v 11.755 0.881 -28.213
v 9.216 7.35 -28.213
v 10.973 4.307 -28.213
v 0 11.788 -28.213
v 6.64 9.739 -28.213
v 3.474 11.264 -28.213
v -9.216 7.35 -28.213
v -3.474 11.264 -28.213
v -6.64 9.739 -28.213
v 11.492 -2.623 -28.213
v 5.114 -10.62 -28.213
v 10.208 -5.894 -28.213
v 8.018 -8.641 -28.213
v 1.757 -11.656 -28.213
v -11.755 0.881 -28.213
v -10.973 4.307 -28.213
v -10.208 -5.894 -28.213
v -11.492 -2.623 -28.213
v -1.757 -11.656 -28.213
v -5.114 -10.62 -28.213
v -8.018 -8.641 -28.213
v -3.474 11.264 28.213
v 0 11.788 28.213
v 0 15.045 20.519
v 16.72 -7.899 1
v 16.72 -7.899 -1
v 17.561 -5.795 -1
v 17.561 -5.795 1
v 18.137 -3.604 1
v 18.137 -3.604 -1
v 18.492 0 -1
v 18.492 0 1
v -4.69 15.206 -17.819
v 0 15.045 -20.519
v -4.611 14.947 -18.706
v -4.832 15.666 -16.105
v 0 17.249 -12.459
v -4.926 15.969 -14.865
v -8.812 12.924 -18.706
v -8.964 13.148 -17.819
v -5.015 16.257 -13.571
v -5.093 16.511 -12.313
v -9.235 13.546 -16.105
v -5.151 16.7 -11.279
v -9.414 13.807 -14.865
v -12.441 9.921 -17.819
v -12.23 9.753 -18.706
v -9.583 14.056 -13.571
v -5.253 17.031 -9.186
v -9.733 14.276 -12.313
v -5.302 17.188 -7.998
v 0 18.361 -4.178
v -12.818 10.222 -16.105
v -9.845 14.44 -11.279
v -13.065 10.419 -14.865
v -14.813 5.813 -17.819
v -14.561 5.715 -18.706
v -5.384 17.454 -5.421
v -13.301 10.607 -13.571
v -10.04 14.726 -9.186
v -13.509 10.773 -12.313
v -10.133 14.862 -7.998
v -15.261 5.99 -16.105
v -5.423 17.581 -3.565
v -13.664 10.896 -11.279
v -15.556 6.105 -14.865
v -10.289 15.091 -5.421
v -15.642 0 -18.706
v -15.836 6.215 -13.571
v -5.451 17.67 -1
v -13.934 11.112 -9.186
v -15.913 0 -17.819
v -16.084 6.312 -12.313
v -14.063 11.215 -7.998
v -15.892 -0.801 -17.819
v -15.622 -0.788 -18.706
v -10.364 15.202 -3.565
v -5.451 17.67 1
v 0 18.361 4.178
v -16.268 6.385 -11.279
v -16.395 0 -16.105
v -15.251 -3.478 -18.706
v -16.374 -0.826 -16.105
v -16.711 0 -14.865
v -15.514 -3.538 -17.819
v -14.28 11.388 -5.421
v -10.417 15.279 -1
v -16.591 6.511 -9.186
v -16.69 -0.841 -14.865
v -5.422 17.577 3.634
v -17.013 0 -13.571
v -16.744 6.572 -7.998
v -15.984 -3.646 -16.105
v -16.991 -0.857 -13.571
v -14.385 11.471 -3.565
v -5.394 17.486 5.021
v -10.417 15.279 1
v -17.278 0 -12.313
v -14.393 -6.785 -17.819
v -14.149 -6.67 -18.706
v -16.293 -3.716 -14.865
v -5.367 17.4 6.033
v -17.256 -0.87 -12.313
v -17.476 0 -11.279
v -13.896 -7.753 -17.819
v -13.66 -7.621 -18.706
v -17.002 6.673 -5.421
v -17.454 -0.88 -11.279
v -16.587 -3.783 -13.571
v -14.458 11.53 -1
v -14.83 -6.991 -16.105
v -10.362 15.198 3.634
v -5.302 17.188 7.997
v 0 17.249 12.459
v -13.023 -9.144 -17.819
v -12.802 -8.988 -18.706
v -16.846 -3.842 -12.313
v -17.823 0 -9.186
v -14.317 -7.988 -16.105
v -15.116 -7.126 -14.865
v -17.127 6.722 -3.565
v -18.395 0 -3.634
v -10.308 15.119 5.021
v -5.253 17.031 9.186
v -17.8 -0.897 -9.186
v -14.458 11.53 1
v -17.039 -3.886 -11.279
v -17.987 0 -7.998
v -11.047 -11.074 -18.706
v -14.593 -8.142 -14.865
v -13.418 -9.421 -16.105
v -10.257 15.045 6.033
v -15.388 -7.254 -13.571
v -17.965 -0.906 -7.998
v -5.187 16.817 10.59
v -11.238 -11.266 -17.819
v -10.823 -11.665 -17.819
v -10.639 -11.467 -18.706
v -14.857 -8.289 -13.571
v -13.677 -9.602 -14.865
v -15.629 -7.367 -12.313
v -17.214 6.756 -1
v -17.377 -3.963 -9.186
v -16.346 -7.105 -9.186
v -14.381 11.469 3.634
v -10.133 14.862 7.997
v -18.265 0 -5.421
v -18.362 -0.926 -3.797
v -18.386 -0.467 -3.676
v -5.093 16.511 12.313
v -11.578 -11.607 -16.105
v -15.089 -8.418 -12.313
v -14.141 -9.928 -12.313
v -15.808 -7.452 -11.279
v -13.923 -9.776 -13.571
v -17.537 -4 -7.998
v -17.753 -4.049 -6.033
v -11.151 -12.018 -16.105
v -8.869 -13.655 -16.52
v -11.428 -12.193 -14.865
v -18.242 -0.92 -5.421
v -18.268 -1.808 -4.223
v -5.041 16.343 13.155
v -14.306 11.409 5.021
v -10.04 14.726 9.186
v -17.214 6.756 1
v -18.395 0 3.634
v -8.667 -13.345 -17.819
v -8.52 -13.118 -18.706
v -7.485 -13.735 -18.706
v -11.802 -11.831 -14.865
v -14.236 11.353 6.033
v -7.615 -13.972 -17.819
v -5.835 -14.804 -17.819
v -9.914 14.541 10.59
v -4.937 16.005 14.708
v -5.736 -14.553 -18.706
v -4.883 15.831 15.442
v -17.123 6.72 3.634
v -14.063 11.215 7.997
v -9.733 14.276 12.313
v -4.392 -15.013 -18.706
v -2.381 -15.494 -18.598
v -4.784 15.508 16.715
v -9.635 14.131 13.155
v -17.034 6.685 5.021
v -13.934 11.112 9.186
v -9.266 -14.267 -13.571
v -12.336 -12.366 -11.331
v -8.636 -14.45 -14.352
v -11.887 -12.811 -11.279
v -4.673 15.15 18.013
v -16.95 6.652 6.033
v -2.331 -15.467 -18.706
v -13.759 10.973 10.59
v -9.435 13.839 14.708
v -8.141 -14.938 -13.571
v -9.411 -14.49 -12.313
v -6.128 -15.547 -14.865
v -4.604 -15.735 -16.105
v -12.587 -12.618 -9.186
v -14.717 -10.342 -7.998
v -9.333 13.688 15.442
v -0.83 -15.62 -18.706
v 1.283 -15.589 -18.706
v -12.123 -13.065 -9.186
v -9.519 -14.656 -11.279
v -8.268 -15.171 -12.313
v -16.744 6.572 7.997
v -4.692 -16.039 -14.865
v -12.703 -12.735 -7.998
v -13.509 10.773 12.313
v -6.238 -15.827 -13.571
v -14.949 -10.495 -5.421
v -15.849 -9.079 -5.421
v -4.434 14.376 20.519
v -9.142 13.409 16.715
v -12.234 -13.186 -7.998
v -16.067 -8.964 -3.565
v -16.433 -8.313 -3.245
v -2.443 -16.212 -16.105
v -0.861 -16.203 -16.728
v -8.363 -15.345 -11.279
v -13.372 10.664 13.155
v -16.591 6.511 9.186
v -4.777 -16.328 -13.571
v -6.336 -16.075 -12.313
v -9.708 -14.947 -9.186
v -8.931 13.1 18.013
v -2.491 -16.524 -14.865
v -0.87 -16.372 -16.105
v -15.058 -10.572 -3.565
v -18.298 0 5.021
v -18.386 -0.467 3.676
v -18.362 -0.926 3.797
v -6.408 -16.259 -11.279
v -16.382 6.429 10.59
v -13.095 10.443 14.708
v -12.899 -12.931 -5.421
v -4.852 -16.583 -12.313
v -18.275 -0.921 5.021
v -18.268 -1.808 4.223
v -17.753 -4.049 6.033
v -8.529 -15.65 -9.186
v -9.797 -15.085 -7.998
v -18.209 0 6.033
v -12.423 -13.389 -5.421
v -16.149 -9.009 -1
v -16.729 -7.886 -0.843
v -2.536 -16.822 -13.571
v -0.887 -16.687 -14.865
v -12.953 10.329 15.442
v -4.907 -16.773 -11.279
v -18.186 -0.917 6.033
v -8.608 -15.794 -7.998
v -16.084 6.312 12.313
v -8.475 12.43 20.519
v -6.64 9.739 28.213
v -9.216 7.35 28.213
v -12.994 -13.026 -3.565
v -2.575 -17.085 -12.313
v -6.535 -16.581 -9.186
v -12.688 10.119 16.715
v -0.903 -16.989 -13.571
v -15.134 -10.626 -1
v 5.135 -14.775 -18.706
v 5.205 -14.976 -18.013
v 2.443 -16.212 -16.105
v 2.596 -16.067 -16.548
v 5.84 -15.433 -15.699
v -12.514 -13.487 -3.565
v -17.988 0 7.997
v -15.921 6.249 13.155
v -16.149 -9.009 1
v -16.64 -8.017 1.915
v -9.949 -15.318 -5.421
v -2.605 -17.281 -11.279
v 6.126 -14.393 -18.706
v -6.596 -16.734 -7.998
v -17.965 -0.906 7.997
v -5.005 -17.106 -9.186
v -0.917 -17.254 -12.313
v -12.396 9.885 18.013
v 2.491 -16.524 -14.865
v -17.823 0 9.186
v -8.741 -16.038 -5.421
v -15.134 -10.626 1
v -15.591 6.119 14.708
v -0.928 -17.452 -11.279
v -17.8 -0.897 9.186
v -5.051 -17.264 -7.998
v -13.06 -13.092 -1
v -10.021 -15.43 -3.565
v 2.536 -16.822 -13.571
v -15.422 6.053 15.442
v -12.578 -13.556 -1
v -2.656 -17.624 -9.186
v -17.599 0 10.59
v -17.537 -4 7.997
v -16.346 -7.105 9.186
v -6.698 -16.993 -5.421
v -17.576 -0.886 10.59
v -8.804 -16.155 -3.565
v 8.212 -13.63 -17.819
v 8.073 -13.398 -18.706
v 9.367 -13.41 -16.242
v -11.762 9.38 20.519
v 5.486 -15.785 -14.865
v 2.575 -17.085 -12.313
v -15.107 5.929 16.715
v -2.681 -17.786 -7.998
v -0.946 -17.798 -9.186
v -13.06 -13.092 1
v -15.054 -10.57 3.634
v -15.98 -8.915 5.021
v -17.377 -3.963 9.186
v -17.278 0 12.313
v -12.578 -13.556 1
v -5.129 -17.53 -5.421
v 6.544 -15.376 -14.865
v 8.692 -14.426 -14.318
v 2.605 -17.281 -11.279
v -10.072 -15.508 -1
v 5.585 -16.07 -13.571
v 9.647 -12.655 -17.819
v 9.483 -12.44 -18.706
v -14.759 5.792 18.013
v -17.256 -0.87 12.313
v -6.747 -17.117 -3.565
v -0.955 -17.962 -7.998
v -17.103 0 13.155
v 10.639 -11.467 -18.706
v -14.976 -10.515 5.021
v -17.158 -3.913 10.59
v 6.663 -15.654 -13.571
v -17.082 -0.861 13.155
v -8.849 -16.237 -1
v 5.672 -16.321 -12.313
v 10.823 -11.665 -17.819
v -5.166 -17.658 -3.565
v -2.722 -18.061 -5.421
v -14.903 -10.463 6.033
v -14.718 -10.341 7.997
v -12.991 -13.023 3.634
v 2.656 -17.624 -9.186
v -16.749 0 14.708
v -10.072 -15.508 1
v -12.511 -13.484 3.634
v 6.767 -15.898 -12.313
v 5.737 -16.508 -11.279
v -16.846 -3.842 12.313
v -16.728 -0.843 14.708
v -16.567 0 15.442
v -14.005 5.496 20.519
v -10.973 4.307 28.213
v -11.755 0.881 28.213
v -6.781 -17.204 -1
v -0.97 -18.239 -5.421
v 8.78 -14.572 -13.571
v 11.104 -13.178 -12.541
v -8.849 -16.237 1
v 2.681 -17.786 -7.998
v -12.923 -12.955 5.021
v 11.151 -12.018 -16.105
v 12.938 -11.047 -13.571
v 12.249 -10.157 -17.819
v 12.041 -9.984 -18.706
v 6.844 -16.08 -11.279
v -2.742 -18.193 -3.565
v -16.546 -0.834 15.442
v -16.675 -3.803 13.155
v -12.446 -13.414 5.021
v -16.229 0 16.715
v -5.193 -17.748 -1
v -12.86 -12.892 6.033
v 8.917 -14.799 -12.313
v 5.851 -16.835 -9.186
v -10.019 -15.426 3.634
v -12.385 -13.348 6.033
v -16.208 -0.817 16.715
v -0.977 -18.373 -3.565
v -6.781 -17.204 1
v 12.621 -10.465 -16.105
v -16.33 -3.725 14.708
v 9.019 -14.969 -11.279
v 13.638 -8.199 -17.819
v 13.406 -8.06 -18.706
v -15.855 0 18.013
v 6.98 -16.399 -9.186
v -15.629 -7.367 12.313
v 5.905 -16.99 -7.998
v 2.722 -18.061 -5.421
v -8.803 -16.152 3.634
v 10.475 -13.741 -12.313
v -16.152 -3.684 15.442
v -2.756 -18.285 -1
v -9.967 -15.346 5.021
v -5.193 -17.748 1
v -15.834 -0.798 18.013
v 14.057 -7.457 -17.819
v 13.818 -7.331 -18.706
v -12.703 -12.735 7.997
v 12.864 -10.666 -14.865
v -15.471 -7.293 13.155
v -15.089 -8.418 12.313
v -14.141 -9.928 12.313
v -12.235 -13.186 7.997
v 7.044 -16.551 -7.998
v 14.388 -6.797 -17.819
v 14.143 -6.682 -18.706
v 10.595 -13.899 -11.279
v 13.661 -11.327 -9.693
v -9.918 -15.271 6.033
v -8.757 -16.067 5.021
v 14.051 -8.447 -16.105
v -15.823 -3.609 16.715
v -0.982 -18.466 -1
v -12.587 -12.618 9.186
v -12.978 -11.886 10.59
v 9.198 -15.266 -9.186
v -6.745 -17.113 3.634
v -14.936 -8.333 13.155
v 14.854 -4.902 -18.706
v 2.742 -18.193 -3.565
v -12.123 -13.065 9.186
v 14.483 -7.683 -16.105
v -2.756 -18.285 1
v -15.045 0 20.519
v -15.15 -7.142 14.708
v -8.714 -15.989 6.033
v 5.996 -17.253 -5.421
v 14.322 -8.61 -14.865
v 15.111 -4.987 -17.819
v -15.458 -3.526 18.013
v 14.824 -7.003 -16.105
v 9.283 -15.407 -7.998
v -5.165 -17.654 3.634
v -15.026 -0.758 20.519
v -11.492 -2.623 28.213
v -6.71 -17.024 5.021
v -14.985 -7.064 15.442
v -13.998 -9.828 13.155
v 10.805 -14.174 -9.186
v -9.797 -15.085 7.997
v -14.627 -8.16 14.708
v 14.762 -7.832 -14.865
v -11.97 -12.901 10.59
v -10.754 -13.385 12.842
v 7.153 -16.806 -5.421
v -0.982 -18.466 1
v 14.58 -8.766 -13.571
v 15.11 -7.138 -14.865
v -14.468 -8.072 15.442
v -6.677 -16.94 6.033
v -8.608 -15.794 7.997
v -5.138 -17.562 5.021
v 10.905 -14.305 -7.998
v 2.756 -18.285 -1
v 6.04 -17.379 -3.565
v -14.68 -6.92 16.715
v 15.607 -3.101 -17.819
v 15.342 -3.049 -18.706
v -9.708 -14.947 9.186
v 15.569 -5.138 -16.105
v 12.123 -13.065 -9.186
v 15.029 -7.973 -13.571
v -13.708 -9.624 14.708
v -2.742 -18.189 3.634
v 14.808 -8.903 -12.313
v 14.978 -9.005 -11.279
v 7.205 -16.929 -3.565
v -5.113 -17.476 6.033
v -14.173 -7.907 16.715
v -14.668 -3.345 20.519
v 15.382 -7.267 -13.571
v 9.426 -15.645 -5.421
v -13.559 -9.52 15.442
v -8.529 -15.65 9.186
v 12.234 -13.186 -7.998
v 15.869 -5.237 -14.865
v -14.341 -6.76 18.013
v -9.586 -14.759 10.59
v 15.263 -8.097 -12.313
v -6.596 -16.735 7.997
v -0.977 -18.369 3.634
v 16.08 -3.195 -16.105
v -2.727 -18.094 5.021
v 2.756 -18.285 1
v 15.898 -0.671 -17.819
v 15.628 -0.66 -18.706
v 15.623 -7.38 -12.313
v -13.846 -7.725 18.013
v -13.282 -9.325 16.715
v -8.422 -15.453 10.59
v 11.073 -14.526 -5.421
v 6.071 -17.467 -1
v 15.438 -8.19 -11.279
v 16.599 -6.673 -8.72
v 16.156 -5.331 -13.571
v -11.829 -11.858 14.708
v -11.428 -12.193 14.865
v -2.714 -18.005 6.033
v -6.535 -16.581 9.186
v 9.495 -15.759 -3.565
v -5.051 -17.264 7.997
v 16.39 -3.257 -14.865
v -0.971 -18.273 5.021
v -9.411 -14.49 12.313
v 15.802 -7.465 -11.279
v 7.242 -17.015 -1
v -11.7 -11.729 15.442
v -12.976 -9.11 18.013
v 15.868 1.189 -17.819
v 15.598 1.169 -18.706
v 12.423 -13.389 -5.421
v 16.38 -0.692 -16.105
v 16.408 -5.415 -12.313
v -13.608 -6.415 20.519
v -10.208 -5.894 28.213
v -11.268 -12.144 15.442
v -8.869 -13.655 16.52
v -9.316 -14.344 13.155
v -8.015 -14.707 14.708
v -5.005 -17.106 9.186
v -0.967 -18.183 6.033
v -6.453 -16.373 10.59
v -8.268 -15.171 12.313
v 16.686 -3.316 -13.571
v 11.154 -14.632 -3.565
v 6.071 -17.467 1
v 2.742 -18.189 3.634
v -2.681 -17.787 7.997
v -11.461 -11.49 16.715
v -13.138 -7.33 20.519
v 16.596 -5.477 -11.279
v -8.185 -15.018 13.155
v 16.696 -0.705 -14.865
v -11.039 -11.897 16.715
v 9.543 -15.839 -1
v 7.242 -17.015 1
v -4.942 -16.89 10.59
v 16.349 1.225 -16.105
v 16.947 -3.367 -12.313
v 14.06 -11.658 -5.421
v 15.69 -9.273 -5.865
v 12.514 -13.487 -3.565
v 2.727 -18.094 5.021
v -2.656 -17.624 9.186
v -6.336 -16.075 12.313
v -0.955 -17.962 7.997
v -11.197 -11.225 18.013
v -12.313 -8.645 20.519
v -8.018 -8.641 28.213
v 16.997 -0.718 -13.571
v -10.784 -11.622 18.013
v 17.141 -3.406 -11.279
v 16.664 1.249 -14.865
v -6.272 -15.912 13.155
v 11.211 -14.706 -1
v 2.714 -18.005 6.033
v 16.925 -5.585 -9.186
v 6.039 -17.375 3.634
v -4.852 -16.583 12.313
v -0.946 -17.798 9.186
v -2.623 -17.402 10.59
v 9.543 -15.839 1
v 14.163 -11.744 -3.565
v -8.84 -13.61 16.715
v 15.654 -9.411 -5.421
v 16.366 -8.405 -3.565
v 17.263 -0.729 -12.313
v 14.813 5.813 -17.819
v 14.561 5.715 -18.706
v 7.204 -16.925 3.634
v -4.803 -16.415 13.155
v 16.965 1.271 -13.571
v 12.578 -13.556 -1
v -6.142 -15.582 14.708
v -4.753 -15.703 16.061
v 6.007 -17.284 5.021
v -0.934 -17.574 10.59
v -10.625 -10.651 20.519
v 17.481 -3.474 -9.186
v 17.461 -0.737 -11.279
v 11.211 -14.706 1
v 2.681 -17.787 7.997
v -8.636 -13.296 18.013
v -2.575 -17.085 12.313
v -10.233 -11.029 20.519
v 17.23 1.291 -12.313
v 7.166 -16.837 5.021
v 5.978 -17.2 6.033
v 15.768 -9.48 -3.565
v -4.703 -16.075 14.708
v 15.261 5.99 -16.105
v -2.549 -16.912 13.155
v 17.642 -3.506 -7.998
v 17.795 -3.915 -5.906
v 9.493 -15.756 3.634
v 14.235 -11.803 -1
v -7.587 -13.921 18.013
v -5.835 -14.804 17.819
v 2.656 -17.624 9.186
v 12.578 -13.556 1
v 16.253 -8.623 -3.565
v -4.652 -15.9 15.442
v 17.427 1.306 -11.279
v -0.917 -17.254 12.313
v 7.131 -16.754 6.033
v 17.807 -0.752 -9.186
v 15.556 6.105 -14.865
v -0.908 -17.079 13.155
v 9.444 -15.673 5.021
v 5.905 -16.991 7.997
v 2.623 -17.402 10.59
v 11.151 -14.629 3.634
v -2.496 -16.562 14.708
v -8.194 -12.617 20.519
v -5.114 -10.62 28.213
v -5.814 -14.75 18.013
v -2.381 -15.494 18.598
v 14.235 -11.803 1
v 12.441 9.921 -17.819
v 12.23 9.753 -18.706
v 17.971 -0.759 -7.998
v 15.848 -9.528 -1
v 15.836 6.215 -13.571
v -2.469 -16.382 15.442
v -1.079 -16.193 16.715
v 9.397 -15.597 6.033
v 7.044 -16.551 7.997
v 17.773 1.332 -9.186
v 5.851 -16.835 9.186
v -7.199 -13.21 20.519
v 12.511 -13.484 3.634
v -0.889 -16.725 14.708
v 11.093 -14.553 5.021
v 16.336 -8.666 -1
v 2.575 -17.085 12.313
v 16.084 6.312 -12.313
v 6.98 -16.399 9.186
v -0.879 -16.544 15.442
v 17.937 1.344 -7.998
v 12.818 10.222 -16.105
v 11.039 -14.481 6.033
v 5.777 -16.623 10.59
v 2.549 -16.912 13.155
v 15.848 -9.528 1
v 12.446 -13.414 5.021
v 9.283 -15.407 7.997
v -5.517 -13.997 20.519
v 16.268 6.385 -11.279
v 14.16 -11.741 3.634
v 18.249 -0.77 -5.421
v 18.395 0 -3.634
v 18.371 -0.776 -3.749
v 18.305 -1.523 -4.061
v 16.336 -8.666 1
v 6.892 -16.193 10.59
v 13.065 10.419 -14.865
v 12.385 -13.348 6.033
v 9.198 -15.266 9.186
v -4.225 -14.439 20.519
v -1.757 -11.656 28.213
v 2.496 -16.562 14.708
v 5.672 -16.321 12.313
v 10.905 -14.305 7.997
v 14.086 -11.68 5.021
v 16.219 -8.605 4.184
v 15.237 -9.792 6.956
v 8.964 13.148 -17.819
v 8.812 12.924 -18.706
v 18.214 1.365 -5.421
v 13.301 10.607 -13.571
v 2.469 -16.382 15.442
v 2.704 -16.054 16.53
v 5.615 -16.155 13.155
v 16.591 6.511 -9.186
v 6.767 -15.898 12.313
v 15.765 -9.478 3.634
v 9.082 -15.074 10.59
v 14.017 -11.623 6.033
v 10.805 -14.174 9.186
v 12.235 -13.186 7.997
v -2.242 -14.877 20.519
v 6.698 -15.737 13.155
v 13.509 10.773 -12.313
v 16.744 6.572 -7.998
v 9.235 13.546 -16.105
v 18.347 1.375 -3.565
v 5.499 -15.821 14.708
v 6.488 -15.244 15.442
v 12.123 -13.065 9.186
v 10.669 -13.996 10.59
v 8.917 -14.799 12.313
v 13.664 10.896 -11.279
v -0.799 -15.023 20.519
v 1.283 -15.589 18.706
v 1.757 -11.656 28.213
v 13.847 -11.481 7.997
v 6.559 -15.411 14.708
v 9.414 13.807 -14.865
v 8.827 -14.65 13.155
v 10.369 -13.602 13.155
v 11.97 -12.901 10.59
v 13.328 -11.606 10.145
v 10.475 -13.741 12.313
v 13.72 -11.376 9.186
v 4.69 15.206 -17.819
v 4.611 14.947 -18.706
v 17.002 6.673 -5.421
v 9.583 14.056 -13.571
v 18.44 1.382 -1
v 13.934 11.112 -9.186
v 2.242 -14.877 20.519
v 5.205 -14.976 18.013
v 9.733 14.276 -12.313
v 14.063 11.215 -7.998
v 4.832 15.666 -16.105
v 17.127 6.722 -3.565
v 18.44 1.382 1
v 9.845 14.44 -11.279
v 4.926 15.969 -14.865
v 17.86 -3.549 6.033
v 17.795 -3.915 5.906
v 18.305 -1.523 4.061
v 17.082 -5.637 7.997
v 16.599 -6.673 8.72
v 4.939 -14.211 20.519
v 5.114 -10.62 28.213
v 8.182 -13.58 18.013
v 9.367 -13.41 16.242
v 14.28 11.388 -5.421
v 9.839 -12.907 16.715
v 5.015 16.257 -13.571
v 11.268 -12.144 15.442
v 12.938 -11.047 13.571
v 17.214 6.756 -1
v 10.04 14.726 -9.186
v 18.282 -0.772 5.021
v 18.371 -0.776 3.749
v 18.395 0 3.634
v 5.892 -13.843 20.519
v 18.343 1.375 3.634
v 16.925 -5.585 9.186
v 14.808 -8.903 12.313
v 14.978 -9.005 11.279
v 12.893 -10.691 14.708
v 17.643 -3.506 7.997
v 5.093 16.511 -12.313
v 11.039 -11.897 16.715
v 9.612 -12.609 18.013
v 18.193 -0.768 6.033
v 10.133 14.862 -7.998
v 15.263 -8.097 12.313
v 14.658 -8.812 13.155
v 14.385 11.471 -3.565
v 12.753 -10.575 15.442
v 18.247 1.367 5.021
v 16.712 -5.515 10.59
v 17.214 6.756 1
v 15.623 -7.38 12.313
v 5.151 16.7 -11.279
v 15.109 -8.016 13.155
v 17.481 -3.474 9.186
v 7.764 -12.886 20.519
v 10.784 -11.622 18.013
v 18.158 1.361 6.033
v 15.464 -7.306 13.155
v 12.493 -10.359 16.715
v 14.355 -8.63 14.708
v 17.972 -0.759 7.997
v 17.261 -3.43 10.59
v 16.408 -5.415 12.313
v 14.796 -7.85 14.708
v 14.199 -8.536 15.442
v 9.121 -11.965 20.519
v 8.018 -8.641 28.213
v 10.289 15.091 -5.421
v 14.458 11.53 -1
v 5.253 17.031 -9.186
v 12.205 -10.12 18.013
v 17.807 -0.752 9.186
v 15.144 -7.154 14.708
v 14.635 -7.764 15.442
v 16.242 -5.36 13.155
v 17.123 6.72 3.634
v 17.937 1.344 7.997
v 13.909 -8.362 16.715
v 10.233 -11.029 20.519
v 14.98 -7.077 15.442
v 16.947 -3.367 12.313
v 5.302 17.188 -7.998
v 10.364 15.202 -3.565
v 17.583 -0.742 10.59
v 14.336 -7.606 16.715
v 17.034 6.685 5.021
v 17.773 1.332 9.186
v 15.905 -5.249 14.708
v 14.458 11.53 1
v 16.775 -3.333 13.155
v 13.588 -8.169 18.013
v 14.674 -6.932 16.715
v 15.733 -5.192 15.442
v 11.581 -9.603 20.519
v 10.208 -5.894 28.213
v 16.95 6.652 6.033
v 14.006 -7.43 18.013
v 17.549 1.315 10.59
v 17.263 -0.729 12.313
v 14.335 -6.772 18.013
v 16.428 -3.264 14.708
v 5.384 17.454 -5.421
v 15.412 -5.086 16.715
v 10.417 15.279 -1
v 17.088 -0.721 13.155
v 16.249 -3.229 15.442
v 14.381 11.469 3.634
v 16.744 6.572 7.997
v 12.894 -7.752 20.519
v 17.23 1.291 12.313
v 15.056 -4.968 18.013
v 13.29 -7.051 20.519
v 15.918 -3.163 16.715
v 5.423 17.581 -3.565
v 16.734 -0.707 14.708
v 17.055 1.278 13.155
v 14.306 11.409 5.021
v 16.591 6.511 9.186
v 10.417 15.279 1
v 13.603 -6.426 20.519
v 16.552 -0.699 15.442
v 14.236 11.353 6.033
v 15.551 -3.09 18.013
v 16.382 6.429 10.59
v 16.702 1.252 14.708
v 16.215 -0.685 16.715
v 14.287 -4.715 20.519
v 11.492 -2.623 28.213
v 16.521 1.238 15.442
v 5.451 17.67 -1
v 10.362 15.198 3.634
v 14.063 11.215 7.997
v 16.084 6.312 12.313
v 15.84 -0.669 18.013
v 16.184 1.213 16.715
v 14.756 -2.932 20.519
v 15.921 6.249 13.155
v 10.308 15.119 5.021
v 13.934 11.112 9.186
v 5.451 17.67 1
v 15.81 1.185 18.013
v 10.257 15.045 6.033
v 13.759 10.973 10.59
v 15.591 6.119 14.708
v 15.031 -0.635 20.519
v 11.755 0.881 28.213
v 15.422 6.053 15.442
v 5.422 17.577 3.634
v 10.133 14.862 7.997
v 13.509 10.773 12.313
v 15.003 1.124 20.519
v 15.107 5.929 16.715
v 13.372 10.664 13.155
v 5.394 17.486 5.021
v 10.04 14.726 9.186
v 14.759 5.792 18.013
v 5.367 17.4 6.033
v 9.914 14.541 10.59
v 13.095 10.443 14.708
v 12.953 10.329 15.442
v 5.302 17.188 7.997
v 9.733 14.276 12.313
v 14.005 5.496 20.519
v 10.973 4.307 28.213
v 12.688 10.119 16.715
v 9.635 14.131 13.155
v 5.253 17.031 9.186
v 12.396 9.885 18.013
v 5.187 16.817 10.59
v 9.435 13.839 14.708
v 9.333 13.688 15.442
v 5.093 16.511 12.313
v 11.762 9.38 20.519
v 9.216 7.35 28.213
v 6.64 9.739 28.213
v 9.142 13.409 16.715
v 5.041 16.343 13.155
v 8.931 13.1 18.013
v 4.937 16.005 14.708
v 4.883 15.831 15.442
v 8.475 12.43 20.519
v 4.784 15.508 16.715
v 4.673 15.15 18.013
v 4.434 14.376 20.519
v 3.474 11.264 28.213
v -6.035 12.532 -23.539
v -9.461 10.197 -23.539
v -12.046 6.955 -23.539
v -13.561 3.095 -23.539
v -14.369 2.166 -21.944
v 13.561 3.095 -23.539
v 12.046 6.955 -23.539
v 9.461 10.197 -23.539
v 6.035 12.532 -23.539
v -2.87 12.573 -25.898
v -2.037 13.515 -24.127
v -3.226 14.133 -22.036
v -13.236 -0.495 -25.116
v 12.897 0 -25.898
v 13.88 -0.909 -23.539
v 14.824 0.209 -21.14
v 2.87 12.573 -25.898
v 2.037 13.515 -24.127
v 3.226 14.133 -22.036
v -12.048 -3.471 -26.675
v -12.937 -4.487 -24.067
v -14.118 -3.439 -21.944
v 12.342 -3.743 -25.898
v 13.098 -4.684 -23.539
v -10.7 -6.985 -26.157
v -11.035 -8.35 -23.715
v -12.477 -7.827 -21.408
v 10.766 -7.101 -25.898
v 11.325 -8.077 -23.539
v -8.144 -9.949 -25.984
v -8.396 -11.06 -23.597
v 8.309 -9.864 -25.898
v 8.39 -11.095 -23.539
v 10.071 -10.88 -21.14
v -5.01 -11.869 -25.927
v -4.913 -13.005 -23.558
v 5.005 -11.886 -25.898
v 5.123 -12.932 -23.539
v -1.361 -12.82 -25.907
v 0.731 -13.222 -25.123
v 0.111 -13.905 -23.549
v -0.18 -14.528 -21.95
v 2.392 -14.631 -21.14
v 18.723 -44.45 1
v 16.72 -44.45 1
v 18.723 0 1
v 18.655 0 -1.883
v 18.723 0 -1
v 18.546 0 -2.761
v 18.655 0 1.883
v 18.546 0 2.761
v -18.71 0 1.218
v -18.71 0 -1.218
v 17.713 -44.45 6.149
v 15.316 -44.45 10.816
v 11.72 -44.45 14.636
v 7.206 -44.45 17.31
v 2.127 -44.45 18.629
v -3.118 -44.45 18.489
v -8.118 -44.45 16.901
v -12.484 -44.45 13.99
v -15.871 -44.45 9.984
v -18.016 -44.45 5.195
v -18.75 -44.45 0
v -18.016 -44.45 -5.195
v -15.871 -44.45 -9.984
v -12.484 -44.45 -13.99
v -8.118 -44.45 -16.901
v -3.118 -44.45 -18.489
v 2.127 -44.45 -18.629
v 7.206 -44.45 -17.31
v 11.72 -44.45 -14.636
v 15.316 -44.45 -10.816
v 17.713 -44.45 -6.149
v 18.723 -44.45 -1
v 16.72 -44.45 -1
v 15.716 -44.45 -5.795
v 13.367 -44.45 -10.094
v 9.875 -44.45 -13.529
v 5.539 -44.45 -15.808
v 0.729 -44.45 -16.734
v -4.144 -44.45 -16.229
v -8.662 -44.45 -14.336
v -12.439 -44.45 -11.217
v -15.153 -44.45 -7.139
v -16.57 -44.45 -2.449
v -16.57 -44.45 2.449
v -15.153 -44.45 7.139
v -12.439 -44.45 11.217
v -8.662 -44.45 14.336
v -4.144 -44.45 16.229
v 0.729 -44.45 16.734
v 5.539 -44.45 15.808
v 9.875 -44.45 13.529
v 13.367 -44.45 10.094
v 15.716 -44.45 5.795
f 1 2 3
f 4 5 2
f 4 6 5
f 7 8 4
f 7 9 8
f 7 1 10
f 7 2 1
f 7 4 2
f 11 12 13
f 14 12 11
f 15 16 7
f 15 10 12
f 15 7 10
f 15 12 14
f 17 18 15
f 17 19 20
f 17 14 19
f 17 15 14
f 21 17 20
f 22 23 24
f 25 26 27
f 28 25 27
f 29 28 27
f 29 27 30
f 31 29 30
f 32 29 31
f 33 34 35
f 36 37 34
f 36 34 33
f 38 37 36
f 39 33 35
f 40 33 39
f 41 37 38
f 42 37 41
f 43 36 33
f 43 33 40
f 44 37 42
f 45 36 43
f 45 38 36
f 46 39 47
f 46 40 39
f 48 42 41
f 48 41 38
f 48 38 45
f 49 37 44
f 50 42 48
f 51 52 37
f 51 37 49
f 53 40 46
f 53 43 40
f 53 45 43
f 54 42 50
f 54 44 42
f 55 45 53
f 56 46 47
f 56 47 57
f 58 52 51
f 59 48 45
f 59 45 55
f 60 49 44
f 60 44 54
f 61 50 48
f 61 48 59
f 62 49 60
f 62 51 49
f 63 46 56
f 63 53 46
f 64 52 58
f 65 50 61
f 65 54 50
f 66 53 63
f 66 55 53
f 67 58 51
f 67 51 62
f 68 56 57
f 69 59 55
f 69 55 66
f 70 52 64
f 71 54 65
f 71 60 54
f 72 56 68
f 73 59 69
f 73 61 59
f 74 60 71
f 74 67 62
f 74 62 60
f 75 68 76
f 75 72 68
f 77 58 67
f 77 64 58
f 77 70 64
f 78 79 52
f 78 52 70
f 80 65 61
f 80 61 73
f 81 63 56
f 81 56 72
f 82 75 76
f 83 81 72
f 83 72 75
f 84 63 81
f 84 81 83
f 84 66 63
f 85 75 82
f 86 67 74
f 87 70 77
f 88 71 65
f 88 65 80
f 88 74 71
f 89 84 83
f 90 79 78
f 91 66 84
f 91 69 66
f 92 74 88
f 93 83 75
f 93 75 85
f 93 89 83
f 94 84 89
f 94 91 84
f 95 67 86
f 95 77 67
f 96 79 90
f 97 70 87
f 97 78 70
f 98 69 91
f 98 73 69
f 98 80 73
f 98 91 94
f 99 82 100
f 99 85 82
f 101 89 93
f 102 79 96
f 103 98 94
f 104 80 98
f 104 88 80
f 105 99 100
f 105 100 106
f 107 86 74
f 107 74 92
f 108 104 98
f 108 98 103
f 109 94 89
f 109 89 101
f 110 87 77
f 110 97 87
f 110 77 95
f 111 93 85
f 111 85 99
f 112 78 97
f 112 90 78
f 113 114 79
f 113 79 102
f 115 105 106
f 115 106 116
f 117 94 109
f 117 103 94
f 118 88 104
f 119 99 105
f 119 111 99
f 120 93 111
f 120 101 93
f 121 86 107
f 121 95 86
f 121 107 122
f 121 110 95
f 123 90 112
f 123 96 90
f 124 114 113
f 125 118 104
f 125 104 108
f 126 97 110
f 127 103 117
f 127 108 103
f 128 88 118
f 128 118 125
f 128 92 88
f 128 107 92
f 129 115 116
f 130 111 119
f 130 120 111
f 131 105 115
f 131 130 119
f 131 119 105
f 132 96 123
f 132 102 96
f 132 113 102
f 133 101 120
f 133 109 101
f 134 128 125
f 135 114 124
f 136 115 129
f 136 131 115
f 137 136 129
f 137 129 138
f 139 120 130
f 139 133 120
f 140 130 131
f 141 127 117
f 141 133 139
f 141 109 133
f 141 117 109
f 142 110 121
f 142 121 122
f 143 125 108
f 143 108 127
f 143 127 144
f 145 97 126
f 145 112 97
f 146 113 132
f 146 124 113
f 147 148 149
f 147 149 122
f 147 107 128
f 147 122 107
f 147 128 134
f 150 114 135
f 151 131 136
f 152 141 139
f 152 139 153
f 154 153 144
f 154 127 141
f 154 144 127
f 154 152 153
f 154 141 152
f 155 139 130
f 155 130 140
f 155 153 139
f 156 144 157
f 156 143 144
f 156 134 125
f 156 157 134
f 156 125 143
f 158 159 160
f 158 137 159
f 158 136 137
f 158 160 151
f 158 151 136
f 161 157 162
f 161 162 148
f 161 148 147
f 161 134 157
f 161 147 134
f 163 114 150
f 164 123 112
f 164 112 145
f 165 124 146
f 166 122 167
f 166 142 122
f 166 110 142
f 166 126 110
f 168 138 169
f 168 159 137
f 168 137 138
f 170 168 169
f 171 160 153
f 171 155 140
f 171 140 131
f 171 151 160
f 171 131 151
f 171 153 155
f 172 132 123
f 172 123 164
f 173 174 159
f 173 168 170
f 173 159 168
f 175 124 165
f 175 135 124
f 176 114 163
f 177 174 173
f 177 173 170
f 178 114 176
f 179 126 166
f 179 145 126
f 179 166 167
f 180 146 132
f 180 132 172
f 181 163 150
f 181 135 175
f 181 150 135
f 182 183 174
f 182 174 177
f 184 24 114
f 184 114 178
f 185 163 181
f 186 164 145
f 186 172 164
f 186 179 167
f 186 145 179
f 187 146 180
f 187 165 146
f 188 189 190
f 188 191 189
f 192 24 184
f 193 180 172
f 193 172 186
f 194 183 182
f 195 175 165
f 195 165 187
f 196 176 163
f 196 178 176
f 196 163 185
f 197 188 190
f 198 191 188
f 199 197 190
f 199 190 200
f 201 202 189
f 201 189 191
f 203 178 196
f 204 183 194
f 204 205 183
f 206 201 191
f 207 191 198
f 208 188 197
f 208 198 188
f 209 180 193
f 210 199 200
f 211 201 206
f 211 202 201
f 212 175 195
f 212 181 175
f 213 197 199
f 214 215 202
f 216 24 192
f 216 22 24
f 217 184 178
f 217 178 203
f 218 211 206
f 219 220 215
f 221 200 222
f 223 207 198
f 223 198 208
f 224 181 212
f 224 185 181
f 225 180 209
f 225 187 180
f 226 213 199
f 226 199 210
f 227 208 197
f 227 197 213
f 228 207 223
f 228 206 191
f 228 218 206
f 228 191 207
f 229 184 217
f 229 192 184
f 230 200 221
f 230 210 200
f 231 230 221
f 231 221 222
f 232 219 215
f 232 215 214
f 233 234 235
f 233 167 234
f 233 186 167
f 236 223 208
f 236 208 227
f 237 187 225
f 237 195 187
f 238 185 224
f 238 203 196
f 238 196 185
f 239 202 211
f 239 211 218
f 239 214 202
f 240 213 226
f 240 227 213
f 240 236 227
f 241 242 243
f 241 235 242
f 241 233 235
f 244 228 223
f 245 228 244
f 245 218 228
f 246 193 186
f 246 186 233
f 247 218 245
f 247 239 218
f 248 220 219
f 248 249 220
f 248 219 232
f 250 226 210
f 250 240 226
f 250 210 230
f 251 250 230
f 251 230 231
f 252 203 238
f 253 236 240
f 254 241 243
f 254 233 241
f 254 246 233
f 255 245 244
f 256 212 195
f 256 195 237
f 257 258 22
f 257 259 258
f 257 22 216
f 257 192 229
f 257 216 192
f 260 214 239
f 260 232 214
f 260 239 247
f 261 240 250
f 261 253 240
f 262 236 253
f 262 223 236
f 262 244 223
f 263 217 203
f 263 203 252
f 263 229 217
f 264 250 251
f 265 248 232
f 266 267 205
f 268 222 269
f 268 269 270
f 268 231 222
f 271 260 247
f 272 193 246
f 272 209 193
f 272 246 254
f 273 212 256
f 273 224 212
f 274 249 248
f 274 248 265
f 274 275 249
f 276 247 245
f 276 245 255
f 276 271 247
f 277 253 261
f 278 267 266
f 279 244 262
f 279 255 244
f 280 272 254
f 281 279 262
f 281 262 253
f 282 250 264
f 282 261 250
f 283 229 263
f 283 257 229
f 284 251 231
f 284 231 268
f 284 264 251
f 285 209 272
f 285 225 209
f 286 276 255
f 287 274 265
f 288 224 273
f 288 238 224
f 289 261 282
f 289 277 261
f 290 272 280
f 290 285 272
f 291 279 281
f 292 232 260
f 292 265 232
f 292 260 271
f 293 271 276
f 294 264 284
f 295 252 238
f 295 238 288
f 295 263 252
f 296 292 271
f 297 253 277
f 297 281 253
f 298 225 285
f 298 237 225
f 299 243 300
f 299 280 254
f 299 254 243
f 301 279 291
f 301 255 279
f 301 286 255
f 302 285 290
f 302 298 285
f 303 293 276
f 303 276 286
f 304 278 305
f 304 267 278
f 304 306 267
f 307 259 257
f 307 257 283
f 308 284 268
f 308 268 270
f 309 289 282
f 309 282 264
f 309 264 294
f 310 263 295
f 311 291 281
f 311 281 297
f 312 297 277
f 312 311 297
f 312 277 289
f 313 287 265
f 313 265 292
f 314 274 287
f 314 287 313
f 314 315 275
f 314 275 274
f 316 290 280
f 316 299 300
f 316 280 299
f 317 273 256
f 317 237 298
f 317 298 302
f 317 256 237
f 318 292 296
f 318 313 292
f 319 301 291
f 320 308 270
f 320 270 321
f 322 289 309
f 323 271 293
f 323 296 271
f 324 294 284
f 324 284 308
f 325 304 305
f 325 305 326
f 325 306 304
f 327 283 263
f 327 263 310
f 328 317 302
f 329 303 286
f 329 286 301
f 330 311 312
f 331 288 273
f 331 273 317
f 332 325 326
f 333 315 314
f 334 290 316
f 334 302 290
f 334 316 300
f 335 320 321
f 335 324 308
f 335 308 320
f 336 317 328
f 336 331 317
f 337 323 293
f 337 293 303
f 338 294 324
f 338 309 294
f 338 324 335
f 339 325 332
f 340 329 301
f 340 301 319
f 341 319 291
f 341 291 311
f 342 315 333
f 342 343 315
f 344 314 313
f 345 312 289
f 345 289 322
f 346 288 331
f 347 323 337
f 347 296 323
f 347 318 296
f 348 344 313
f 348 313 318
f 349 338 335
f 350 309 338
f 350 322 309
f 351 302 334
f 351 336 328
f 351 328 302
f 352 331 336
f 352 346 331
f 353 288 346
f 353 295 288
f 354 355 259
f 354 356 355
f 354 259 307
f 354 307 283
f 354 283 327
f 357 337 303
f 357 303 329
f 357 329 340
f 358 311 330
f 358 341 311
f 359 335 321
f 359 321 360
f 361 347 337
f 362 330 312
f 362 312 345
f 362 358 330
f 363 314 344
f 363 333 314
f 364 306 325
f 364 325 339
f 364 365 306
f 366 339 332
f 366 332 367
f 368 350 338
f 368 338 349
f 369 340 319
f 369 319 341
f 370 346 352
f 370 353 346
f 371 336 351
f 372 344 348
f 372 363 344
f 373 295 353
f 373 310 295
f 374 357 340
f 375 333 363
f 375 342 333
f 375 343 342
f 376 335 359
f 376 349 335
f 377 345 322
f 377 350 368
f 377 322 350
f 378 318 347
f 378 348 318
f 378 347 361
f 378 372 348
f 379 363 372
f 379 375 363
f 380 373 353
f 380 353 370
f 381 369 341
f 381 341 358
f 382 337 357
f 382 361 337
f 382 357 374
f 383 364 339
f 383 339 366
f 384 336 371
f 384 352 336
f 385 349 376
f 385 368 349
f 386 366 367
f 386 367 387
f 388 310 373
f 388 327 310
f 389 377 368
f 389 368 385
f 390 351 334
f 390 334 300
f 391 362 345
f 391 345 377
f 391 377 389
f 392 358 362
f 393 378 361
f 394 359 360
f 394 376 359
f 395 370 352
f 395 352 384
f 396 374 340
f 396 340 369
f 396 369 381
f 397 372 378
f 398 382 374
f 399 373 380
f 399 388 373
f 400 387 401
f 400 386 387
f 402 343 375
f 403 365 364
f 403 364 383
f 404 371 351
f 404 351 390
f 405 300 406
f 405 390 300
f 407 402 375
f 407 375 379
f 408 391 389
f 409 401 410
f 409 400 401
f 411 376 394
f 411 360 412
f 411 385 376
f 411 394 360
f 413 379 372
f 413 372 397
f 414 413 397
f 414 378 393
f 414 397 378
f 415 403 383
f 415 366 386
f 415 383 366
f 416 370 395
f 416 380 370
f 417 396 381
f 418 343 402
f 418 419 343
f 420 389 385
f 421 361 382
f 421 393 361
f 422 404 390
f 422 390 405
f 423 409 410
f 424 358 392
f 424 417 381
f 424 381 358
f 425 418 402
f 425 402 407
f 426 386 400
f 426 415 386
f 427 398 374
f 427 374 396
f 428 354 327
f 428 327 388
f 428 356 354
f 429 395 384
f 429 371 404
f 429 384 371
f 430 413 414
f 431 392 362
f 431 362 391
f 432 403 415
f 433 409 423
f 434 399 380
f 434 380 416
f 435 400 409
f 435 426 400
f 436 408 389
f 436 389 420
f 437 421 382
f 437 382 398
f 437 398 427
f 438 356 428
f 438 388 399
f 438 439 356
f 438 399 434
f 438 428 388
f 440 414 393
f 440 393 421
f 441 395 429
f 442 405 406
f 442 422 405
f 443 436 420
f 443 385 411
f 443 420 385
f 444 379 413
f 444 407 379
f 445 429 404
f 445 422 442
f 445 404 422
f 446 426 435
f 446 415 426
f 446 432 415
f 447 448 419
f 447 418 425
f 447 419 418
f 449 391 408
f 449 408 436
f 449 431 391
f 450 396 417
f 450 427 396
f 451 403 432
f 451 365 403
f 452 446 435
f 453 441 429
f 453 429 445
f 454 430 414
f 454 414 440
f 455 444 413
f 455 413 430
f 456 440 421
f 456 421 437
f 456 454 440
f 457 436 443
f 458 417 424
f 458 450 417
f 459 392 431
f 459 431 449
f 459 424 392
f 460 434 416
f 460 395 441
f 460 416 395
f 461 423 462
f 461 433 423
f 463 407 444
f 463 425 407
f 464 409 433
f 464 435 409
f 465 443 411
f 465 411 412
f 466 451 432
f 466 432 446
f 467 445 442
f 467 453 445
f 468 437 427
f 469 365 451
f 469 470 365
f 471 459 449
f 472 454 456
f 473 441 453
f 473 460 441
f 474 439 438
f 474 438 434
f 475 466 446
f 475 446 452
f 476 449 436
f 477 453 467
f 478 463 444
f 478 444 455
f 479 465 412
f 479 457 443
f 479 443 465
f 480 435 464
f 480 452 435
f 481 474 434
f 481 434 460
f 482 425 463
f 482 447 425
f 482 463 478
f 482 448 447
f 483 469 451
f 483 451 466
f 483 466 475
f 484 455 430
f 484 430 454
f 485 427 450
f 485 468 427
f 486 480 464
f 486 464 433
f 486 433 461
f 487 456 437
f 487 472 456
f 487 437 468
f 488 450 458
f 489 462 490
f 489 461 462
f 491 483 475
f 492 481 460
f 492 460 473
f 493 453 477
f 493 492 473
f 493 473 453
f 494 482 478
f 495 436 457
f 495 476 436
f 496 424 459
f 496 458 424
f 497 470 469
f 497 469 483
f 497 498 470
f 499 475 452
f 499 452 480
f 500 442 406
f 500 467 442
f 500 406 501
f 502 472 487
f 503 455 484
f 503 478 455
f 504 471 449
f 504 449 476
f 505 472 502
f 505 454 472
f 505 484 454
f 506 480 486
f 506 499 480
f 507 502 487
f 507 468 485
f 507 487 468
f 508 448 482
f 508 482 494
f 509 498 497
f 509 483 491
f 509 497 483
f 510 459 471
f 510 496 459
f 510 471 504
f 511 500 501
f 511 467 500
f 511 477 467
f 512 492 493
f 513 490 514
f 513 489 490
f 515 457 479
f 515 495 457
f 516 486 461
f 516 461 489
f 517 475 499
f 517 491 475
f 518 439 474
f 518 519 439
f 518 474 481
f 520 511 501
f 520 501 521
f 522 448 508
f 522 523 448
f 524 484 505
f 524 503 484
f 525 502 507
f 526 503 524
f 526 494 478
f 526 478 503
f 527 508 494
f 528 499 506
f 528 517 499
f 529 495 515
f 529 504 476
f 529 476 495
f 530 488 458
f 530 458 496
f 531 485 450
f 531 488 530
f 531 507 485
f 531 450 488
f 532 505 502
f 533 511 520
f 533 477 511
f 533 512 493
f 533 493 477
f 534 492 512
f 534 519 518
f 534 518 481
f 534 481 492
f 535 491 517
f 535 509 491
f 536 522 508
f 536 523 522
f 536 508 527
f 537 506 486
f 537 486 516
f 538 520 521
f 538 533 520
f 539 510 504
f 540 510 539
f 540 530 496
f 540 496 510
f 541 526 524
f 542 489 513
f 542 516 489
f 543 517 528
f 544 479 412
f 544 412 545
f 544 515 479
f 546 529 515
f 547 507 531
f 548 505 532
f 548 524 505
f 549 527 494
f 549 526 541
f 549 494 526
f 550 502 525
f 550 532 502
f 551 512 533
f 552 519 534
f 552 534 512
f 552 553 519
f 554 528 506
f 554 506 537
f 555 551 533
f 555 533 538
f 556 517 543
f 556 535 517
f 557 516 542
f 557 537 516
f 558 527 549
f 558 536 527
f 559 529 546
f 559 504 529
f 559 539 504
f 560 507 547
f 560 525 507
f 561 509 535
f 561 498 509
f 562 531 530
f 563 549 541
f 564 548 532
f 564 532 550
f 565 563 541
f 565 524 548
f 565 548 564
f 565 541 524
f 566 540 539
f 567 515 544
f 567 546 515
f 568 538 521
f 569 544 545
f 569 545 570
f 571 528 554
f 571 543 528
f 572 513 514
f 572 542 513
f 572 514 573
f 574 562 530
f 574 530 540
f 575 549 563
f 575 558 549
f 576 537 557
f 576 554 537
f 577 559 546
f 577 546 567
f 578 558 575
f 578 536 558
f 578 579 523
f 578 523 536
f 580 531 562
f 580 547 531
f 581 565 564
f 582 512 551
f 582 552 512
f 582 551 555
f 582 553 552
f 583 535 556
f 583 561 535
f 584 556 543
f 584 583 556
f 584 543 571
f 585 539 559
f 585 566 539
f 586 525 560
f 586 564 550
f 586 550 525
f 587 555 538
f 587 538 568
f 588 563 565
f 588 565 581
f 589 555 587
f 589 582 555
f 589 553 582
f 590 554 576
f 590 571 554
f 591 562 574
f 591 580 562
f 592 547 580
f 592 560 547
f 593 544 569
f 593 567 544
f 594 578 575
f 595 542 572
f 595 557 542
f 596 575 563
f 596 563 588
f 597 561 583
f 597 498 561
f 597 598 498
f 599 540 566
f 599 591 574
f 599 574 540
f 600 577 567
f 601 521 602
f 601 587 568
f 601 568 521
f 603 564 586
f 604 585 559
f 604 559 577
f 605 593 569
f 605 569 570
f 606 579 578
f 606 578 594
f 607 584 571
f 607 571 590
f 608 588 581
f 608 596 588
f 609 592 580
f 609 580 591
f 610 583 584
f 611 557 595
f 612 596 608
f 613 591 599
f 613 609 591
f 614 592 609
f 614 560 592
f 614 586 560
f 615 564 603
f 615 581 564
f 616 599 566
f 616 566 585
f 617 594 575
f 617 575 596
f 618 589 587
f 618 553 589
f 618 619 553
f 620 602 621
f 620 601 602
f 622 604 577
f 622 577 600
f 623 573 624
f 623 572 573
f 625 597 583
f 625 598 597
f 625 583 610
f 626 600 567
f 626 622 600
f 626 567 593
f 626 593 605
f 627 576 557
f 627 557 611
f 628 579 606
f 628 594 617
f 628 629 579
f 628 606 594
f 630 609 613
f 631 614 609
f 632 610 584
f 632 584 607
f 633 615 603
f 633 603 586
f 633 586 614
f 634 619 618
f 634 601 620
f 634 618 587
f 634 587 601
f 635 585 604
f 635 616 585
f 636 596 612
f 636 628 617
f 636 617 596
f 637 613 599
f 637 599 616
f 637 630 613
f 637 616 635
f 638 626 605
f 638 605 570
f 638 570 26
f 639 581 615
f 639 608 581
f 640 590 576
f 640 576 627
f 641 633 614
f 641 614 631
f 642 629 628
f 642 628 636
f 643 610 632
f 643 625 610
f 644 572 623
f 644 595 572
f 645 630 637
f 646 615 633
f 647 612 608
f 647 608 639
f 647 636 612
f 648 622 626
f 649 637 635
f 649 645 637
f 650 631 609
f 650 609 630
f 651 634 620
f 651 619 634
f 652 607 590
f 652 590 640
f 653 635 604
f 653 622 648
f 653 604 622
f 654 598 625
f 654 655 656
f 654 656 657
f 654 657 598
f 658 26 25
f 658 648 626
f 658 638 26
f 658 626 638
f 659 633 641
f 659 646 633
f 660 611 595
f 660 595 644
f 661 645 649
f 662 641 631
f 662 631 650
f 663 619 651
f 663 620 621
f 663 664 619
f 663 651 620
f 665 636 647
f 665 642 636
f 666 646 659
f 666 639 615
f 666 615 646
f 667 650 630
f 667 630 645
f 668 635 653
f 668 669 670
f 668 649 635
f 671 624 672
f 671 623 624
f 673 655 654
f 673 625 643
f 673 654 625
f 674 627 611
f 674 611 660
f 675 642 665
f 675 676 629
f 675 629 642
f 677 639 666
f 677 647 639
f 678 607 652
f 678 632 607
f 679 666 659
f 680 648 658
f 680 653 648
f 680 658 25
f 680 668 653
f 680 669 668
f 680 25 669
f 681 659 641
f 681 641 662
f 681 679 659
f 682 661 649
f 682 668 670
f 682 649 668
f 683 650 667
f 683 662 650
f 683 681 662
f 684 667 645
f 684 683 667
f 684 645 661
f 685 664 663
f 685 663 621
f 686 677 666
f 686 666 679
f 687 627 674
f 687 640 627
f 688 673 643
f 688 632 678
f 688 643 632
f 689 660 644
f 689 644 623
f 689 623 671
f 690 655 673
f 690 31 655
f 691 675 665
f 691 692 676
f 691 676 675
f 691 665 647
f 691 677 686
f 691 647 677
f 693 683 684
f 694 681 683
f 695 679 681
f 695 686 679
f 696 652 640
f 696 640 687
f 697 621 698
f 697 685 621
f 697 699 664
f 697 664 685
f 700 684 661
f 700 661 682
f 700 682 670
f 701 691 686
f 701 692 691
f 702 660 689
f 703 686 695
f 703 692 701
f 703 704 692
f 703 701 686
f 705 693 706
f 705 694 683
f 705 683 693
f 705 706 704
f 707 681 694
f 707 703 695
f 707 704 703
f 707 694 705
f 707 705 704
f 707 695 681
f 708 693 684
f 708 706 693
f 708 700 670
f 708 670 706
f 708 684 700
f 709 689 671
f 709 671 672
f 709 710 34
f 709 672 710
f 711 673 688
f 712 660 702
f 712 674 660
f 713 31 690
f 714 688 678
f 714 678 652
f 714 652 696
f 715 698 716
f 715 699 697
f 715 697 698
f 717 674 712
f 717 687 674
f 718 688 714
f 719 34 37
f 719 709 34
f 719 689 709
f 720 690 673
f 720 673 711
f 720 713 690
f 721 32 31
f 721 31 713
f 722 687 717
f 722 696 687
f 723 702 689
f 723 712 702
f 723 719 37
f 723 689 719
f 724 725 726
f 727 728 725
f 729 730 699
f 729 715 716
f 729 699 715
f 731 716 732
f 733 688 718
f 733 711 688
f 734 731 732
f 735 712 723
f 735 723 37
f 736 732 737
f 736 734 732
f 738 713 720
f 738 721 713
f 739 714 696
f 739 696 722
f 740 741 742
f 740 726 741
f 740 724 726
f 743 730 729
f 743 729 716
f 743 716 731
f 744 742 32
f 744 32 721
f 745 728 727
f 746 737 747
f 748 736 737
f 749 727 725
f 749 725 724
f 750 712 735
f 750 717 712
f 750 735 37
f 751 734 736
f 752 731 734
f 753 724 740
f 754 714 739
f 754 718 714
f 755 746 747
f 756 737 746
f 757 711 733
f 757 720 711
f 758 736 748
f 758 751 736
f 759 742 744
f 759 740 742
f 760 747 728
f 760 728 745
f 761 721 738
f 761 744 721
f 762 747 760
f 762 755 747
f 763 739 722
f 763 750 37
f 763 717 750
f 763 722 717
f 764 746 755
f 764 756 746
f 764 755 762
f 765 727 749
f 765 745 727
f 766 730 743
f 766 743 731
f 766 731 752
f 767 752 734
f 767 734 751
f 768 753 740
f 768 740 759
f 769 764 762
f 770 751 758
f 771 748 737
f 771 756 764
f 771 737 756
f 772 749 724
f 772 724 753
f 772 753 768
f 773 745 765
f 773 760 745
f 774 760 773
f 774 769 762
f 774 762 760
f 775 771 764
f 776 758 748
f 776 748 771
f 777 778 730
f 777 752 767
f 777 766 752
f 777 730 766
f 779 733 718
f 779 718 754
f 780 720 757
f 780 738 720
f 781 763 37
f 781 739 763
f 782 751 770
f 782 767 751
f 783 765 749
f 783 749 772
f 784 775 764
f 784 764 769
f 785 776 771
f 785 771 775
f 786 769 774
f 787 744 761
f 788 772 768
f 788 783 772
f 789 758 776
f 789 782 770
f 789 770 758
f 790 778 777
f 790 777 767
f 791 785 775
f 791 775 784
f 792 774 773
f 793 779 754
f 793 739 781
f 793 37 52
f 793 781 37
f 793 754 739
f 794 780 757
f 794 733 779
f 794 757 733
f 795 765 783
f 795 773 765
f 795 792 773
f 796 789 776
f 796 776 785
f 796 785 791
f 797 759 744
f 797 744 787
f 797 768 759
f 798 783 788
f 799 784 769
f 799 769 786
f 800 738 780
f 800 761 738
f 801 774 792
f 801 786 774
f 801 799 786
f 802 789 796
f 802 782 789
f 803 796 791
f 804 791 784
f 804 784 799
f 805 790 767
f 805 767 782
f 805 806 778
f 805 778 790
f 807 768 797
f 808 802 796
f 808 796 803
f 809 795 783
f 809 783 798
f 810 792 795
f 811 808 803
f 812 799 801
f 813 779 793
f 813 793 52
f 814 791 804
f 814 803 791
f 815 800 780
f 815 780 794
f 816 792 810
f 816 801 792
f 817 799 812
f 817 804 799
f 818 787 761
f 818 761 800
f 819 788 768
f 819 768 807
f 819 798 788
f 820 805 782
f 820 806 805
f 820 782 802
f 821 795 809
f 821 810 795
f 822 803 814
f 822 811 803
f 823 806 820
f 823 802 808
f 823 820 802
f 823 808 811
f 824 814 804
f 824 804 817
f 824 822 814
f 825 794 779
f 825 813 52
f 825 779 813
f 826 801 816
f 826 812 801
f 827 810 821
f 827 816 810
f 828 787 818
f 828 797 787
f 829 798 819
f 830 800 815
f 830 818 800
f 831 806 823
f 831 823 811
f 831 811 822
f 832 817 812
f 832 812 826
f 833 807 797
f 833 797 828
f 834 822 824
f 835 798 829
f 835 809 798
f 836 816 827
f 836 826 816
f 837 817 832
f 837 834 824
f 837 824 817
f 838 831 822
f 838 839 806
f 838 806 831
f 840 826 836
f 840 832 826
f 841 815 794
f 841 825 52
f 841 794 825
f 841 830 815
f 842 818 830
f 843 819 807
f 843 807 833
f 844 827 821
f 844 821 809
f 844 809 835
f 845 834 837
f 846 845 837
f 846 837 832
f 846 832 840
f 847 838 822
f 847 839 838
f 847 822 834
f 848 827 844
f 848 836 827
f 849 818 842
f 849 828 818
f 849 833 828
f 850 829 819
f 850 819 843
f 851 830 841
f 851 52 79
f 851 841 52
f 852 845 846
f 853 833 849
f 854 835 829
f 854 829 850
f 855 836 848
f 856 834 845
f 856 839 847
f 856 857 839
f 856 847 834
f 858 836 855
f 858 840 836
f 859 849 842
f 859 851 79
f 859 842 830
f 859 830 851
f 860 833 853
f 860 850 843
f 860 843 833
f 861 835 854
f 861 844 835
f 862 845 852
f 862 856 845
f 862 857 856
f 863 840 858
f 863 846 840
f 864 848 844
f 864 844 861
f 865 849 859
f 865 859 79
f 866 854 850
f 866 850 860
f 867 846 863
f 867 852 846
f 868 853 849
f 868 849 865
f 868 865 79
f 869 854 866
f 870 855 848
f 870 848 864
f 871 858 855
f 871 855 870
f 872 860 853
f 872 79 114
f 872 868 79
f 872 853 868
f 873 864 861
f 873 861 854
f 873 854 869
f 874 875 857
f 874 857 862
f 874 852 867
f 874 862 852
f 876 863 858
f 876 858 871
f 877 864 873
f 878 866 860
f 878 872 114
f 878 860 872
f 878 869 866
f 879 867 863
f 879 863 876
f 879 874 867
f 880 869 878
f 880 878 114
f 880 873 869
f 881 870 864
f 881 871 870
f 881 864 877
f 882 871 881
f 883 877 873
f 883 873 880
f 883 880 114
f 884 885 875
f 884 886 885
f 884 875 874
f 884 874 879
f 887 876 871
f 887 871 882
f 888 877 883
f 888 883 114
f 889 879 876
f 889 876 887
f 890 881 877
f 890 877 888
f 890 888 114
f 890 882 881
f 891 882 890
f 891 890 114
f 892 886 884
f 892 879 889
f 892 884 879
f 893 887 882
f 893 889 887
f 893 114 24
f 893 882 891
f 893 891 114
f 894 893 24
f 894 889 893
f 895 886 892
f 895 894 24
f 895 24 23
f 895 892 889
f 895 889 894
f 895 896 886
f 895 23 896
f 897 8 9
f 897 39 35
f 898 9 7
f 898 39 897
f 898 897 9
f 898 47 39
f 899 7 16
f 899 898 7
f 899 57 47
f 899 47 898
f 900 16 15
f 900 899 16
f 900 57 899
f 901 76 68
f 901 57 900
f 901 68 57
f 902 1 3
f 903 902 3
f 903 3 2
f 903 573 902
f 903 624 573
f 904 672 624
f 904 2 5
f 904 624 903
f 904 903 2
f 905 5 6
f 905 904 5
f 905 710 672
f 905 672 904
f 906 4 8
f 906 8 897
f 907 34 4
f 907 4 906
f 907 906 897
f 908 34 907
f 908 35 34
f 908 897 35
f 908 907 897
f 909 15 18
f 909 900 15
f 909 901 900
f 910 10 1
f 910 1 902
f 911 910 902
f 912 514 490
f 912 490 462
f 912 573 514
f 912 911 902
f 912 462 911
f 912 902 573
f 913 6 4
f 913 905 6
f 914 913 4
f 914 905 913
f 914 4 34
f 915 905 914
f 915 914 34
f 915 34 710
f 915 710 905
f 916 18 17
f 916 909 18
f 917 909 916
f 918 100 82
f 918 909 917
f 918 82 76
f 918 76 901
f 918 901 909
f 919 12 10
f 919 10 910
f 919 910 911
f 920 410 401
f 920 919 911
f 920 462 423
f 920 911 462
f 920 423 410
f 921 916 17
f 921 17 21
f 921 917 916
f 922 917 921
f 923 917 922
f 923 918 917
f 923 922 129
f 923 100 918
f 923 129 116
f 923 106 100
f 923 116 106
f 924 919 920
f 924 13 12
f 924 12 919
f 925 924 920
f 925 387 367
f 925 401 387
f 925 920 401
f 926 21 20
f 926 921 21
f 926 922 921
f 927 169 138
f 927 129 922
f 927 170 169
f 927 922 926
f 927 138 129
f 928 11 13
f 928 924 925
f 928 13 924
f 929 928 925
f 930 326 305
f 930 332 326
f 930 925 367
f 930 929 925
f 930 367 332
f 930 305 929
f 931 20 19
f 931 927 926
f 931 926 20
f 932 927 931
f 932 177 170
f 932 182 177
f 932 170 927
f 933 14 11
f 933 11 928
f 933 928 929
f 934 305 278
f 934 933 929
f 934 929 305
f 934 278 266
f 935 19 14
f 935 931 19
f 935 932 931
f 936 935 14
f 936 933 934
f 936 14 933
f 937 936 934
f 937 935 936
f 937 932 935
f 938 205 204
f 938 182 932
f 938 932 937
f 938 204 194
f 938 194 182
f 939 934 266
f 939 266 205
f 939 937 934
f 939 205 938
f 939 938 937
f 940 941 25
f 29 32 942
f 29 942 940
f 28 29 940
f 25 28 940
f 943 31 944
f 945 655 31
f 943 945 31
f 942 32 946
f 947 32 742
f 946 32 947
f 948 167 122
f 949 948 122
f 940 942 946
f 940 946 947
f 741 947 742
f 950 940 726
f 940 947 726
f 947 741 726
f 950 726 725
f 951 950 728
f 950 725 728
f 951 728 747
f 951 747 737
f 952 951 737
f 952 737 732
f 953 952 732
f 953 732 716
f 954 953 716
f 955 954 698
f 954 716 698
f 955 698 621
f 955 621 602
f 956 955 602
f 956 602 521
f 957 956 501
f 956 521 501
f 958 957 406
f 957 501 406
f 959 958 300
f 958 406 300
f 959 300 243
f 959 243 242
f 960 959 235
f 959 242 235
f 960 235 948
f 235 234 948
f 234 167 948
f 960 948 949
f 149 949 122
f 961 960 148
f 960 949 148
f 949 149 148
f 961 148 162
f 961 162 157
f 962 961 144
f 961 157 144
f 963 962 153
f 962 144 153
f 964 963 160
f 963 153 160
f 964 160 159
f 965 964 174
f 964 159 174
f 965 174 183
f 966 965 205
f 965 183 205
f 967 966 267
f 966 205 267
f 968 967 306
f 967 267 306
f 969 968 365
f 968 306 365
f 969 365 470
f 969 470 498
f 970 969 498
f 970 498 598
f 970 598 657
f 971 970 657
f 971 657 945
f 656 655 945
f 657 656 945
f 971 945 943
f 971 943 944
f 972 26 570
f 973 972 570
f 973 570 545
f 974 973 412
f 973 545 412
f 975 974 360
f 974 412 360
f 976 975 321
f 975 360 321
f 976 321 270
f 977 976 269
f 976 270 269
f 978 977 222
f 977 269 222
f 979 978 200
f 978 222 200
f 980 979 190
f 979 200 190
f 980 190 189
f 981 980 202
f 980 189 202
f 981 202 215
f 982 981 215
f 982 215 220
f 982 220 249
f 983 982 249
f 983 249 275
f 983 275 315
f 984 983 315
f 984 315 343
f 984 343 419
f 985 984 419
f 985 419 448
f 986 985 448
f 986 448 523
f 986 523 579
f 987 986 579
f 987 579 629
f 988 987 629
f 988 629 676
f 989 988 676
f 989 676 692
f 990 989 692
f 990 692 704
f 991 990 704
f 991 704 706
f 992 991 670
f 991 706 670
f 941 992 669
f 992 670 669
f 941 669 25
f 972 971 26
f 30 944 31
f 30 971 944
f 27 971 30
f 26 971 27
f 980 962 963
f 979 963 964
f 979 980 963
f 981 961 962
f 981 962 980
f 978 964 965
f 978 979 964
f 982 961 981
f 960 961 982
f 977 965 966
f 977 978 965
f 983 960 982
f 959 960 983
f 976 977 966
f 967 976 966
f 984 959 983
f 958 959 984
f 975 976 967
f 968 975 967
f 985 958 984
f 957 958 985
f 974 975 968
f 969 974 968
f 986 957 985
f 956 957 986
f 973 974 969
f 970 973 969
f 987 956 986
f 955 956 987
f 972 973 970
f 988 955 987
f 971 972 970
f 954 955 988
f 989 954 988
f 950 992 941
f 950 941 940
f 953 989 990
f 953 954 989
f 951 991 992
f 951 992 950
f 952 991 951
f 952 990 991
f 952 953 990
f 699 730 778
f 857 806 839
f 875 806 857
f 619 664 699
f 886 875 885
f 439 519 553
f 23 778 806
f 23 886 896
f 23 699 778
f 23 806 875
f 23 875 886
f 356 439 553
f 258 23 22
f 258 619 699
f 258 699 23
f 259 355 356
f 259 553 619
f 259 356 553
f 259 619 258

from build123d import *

# Parameters (mm, degrees)
F1_DEPTH = 44.45


with BuildPart() as f1:
    # F0 (on Front) → F1 (new body)
    with BuildSketch(Plane.XZ):
        with BuildLine():
            ThreePointArc((16.7201226072, -1), (-16.75, 0), (16.7201226072, 1))
            Line((16.7201226072, 1), (18.7233143434, 1))
            ThreePointArc((18.7233143434, 1), (-18.75, 0), (18.7233143434, -1))
            Line((18.7233143434, -1), (16.7201226072, -1))
        make_face()
    extrude(amount=F1_DEPTH)

    # F2 (on Right) → F3 (revolve)
    with BuildSketch(Plane.YZ):
        with BuildLine():
            Line((0, 28.2133857439), (0, 0))
            Line((0, 0), (0, -28.2133857439))
            Line((0, -28.2133857439), (11.7877177934, -28.2133857439))
            ThreePointArc((11.7877177934, -28.2133857439), (18.5, 0), (11.7877177934, 28.2133857439))
            Line((11.7877177934, 28.2133857439), (0, 28.2133857439))
        make_face()
    revolve(axis=Axis((0, 0, 14.106692872), (0, 0, 1)))


solid = f1.part
